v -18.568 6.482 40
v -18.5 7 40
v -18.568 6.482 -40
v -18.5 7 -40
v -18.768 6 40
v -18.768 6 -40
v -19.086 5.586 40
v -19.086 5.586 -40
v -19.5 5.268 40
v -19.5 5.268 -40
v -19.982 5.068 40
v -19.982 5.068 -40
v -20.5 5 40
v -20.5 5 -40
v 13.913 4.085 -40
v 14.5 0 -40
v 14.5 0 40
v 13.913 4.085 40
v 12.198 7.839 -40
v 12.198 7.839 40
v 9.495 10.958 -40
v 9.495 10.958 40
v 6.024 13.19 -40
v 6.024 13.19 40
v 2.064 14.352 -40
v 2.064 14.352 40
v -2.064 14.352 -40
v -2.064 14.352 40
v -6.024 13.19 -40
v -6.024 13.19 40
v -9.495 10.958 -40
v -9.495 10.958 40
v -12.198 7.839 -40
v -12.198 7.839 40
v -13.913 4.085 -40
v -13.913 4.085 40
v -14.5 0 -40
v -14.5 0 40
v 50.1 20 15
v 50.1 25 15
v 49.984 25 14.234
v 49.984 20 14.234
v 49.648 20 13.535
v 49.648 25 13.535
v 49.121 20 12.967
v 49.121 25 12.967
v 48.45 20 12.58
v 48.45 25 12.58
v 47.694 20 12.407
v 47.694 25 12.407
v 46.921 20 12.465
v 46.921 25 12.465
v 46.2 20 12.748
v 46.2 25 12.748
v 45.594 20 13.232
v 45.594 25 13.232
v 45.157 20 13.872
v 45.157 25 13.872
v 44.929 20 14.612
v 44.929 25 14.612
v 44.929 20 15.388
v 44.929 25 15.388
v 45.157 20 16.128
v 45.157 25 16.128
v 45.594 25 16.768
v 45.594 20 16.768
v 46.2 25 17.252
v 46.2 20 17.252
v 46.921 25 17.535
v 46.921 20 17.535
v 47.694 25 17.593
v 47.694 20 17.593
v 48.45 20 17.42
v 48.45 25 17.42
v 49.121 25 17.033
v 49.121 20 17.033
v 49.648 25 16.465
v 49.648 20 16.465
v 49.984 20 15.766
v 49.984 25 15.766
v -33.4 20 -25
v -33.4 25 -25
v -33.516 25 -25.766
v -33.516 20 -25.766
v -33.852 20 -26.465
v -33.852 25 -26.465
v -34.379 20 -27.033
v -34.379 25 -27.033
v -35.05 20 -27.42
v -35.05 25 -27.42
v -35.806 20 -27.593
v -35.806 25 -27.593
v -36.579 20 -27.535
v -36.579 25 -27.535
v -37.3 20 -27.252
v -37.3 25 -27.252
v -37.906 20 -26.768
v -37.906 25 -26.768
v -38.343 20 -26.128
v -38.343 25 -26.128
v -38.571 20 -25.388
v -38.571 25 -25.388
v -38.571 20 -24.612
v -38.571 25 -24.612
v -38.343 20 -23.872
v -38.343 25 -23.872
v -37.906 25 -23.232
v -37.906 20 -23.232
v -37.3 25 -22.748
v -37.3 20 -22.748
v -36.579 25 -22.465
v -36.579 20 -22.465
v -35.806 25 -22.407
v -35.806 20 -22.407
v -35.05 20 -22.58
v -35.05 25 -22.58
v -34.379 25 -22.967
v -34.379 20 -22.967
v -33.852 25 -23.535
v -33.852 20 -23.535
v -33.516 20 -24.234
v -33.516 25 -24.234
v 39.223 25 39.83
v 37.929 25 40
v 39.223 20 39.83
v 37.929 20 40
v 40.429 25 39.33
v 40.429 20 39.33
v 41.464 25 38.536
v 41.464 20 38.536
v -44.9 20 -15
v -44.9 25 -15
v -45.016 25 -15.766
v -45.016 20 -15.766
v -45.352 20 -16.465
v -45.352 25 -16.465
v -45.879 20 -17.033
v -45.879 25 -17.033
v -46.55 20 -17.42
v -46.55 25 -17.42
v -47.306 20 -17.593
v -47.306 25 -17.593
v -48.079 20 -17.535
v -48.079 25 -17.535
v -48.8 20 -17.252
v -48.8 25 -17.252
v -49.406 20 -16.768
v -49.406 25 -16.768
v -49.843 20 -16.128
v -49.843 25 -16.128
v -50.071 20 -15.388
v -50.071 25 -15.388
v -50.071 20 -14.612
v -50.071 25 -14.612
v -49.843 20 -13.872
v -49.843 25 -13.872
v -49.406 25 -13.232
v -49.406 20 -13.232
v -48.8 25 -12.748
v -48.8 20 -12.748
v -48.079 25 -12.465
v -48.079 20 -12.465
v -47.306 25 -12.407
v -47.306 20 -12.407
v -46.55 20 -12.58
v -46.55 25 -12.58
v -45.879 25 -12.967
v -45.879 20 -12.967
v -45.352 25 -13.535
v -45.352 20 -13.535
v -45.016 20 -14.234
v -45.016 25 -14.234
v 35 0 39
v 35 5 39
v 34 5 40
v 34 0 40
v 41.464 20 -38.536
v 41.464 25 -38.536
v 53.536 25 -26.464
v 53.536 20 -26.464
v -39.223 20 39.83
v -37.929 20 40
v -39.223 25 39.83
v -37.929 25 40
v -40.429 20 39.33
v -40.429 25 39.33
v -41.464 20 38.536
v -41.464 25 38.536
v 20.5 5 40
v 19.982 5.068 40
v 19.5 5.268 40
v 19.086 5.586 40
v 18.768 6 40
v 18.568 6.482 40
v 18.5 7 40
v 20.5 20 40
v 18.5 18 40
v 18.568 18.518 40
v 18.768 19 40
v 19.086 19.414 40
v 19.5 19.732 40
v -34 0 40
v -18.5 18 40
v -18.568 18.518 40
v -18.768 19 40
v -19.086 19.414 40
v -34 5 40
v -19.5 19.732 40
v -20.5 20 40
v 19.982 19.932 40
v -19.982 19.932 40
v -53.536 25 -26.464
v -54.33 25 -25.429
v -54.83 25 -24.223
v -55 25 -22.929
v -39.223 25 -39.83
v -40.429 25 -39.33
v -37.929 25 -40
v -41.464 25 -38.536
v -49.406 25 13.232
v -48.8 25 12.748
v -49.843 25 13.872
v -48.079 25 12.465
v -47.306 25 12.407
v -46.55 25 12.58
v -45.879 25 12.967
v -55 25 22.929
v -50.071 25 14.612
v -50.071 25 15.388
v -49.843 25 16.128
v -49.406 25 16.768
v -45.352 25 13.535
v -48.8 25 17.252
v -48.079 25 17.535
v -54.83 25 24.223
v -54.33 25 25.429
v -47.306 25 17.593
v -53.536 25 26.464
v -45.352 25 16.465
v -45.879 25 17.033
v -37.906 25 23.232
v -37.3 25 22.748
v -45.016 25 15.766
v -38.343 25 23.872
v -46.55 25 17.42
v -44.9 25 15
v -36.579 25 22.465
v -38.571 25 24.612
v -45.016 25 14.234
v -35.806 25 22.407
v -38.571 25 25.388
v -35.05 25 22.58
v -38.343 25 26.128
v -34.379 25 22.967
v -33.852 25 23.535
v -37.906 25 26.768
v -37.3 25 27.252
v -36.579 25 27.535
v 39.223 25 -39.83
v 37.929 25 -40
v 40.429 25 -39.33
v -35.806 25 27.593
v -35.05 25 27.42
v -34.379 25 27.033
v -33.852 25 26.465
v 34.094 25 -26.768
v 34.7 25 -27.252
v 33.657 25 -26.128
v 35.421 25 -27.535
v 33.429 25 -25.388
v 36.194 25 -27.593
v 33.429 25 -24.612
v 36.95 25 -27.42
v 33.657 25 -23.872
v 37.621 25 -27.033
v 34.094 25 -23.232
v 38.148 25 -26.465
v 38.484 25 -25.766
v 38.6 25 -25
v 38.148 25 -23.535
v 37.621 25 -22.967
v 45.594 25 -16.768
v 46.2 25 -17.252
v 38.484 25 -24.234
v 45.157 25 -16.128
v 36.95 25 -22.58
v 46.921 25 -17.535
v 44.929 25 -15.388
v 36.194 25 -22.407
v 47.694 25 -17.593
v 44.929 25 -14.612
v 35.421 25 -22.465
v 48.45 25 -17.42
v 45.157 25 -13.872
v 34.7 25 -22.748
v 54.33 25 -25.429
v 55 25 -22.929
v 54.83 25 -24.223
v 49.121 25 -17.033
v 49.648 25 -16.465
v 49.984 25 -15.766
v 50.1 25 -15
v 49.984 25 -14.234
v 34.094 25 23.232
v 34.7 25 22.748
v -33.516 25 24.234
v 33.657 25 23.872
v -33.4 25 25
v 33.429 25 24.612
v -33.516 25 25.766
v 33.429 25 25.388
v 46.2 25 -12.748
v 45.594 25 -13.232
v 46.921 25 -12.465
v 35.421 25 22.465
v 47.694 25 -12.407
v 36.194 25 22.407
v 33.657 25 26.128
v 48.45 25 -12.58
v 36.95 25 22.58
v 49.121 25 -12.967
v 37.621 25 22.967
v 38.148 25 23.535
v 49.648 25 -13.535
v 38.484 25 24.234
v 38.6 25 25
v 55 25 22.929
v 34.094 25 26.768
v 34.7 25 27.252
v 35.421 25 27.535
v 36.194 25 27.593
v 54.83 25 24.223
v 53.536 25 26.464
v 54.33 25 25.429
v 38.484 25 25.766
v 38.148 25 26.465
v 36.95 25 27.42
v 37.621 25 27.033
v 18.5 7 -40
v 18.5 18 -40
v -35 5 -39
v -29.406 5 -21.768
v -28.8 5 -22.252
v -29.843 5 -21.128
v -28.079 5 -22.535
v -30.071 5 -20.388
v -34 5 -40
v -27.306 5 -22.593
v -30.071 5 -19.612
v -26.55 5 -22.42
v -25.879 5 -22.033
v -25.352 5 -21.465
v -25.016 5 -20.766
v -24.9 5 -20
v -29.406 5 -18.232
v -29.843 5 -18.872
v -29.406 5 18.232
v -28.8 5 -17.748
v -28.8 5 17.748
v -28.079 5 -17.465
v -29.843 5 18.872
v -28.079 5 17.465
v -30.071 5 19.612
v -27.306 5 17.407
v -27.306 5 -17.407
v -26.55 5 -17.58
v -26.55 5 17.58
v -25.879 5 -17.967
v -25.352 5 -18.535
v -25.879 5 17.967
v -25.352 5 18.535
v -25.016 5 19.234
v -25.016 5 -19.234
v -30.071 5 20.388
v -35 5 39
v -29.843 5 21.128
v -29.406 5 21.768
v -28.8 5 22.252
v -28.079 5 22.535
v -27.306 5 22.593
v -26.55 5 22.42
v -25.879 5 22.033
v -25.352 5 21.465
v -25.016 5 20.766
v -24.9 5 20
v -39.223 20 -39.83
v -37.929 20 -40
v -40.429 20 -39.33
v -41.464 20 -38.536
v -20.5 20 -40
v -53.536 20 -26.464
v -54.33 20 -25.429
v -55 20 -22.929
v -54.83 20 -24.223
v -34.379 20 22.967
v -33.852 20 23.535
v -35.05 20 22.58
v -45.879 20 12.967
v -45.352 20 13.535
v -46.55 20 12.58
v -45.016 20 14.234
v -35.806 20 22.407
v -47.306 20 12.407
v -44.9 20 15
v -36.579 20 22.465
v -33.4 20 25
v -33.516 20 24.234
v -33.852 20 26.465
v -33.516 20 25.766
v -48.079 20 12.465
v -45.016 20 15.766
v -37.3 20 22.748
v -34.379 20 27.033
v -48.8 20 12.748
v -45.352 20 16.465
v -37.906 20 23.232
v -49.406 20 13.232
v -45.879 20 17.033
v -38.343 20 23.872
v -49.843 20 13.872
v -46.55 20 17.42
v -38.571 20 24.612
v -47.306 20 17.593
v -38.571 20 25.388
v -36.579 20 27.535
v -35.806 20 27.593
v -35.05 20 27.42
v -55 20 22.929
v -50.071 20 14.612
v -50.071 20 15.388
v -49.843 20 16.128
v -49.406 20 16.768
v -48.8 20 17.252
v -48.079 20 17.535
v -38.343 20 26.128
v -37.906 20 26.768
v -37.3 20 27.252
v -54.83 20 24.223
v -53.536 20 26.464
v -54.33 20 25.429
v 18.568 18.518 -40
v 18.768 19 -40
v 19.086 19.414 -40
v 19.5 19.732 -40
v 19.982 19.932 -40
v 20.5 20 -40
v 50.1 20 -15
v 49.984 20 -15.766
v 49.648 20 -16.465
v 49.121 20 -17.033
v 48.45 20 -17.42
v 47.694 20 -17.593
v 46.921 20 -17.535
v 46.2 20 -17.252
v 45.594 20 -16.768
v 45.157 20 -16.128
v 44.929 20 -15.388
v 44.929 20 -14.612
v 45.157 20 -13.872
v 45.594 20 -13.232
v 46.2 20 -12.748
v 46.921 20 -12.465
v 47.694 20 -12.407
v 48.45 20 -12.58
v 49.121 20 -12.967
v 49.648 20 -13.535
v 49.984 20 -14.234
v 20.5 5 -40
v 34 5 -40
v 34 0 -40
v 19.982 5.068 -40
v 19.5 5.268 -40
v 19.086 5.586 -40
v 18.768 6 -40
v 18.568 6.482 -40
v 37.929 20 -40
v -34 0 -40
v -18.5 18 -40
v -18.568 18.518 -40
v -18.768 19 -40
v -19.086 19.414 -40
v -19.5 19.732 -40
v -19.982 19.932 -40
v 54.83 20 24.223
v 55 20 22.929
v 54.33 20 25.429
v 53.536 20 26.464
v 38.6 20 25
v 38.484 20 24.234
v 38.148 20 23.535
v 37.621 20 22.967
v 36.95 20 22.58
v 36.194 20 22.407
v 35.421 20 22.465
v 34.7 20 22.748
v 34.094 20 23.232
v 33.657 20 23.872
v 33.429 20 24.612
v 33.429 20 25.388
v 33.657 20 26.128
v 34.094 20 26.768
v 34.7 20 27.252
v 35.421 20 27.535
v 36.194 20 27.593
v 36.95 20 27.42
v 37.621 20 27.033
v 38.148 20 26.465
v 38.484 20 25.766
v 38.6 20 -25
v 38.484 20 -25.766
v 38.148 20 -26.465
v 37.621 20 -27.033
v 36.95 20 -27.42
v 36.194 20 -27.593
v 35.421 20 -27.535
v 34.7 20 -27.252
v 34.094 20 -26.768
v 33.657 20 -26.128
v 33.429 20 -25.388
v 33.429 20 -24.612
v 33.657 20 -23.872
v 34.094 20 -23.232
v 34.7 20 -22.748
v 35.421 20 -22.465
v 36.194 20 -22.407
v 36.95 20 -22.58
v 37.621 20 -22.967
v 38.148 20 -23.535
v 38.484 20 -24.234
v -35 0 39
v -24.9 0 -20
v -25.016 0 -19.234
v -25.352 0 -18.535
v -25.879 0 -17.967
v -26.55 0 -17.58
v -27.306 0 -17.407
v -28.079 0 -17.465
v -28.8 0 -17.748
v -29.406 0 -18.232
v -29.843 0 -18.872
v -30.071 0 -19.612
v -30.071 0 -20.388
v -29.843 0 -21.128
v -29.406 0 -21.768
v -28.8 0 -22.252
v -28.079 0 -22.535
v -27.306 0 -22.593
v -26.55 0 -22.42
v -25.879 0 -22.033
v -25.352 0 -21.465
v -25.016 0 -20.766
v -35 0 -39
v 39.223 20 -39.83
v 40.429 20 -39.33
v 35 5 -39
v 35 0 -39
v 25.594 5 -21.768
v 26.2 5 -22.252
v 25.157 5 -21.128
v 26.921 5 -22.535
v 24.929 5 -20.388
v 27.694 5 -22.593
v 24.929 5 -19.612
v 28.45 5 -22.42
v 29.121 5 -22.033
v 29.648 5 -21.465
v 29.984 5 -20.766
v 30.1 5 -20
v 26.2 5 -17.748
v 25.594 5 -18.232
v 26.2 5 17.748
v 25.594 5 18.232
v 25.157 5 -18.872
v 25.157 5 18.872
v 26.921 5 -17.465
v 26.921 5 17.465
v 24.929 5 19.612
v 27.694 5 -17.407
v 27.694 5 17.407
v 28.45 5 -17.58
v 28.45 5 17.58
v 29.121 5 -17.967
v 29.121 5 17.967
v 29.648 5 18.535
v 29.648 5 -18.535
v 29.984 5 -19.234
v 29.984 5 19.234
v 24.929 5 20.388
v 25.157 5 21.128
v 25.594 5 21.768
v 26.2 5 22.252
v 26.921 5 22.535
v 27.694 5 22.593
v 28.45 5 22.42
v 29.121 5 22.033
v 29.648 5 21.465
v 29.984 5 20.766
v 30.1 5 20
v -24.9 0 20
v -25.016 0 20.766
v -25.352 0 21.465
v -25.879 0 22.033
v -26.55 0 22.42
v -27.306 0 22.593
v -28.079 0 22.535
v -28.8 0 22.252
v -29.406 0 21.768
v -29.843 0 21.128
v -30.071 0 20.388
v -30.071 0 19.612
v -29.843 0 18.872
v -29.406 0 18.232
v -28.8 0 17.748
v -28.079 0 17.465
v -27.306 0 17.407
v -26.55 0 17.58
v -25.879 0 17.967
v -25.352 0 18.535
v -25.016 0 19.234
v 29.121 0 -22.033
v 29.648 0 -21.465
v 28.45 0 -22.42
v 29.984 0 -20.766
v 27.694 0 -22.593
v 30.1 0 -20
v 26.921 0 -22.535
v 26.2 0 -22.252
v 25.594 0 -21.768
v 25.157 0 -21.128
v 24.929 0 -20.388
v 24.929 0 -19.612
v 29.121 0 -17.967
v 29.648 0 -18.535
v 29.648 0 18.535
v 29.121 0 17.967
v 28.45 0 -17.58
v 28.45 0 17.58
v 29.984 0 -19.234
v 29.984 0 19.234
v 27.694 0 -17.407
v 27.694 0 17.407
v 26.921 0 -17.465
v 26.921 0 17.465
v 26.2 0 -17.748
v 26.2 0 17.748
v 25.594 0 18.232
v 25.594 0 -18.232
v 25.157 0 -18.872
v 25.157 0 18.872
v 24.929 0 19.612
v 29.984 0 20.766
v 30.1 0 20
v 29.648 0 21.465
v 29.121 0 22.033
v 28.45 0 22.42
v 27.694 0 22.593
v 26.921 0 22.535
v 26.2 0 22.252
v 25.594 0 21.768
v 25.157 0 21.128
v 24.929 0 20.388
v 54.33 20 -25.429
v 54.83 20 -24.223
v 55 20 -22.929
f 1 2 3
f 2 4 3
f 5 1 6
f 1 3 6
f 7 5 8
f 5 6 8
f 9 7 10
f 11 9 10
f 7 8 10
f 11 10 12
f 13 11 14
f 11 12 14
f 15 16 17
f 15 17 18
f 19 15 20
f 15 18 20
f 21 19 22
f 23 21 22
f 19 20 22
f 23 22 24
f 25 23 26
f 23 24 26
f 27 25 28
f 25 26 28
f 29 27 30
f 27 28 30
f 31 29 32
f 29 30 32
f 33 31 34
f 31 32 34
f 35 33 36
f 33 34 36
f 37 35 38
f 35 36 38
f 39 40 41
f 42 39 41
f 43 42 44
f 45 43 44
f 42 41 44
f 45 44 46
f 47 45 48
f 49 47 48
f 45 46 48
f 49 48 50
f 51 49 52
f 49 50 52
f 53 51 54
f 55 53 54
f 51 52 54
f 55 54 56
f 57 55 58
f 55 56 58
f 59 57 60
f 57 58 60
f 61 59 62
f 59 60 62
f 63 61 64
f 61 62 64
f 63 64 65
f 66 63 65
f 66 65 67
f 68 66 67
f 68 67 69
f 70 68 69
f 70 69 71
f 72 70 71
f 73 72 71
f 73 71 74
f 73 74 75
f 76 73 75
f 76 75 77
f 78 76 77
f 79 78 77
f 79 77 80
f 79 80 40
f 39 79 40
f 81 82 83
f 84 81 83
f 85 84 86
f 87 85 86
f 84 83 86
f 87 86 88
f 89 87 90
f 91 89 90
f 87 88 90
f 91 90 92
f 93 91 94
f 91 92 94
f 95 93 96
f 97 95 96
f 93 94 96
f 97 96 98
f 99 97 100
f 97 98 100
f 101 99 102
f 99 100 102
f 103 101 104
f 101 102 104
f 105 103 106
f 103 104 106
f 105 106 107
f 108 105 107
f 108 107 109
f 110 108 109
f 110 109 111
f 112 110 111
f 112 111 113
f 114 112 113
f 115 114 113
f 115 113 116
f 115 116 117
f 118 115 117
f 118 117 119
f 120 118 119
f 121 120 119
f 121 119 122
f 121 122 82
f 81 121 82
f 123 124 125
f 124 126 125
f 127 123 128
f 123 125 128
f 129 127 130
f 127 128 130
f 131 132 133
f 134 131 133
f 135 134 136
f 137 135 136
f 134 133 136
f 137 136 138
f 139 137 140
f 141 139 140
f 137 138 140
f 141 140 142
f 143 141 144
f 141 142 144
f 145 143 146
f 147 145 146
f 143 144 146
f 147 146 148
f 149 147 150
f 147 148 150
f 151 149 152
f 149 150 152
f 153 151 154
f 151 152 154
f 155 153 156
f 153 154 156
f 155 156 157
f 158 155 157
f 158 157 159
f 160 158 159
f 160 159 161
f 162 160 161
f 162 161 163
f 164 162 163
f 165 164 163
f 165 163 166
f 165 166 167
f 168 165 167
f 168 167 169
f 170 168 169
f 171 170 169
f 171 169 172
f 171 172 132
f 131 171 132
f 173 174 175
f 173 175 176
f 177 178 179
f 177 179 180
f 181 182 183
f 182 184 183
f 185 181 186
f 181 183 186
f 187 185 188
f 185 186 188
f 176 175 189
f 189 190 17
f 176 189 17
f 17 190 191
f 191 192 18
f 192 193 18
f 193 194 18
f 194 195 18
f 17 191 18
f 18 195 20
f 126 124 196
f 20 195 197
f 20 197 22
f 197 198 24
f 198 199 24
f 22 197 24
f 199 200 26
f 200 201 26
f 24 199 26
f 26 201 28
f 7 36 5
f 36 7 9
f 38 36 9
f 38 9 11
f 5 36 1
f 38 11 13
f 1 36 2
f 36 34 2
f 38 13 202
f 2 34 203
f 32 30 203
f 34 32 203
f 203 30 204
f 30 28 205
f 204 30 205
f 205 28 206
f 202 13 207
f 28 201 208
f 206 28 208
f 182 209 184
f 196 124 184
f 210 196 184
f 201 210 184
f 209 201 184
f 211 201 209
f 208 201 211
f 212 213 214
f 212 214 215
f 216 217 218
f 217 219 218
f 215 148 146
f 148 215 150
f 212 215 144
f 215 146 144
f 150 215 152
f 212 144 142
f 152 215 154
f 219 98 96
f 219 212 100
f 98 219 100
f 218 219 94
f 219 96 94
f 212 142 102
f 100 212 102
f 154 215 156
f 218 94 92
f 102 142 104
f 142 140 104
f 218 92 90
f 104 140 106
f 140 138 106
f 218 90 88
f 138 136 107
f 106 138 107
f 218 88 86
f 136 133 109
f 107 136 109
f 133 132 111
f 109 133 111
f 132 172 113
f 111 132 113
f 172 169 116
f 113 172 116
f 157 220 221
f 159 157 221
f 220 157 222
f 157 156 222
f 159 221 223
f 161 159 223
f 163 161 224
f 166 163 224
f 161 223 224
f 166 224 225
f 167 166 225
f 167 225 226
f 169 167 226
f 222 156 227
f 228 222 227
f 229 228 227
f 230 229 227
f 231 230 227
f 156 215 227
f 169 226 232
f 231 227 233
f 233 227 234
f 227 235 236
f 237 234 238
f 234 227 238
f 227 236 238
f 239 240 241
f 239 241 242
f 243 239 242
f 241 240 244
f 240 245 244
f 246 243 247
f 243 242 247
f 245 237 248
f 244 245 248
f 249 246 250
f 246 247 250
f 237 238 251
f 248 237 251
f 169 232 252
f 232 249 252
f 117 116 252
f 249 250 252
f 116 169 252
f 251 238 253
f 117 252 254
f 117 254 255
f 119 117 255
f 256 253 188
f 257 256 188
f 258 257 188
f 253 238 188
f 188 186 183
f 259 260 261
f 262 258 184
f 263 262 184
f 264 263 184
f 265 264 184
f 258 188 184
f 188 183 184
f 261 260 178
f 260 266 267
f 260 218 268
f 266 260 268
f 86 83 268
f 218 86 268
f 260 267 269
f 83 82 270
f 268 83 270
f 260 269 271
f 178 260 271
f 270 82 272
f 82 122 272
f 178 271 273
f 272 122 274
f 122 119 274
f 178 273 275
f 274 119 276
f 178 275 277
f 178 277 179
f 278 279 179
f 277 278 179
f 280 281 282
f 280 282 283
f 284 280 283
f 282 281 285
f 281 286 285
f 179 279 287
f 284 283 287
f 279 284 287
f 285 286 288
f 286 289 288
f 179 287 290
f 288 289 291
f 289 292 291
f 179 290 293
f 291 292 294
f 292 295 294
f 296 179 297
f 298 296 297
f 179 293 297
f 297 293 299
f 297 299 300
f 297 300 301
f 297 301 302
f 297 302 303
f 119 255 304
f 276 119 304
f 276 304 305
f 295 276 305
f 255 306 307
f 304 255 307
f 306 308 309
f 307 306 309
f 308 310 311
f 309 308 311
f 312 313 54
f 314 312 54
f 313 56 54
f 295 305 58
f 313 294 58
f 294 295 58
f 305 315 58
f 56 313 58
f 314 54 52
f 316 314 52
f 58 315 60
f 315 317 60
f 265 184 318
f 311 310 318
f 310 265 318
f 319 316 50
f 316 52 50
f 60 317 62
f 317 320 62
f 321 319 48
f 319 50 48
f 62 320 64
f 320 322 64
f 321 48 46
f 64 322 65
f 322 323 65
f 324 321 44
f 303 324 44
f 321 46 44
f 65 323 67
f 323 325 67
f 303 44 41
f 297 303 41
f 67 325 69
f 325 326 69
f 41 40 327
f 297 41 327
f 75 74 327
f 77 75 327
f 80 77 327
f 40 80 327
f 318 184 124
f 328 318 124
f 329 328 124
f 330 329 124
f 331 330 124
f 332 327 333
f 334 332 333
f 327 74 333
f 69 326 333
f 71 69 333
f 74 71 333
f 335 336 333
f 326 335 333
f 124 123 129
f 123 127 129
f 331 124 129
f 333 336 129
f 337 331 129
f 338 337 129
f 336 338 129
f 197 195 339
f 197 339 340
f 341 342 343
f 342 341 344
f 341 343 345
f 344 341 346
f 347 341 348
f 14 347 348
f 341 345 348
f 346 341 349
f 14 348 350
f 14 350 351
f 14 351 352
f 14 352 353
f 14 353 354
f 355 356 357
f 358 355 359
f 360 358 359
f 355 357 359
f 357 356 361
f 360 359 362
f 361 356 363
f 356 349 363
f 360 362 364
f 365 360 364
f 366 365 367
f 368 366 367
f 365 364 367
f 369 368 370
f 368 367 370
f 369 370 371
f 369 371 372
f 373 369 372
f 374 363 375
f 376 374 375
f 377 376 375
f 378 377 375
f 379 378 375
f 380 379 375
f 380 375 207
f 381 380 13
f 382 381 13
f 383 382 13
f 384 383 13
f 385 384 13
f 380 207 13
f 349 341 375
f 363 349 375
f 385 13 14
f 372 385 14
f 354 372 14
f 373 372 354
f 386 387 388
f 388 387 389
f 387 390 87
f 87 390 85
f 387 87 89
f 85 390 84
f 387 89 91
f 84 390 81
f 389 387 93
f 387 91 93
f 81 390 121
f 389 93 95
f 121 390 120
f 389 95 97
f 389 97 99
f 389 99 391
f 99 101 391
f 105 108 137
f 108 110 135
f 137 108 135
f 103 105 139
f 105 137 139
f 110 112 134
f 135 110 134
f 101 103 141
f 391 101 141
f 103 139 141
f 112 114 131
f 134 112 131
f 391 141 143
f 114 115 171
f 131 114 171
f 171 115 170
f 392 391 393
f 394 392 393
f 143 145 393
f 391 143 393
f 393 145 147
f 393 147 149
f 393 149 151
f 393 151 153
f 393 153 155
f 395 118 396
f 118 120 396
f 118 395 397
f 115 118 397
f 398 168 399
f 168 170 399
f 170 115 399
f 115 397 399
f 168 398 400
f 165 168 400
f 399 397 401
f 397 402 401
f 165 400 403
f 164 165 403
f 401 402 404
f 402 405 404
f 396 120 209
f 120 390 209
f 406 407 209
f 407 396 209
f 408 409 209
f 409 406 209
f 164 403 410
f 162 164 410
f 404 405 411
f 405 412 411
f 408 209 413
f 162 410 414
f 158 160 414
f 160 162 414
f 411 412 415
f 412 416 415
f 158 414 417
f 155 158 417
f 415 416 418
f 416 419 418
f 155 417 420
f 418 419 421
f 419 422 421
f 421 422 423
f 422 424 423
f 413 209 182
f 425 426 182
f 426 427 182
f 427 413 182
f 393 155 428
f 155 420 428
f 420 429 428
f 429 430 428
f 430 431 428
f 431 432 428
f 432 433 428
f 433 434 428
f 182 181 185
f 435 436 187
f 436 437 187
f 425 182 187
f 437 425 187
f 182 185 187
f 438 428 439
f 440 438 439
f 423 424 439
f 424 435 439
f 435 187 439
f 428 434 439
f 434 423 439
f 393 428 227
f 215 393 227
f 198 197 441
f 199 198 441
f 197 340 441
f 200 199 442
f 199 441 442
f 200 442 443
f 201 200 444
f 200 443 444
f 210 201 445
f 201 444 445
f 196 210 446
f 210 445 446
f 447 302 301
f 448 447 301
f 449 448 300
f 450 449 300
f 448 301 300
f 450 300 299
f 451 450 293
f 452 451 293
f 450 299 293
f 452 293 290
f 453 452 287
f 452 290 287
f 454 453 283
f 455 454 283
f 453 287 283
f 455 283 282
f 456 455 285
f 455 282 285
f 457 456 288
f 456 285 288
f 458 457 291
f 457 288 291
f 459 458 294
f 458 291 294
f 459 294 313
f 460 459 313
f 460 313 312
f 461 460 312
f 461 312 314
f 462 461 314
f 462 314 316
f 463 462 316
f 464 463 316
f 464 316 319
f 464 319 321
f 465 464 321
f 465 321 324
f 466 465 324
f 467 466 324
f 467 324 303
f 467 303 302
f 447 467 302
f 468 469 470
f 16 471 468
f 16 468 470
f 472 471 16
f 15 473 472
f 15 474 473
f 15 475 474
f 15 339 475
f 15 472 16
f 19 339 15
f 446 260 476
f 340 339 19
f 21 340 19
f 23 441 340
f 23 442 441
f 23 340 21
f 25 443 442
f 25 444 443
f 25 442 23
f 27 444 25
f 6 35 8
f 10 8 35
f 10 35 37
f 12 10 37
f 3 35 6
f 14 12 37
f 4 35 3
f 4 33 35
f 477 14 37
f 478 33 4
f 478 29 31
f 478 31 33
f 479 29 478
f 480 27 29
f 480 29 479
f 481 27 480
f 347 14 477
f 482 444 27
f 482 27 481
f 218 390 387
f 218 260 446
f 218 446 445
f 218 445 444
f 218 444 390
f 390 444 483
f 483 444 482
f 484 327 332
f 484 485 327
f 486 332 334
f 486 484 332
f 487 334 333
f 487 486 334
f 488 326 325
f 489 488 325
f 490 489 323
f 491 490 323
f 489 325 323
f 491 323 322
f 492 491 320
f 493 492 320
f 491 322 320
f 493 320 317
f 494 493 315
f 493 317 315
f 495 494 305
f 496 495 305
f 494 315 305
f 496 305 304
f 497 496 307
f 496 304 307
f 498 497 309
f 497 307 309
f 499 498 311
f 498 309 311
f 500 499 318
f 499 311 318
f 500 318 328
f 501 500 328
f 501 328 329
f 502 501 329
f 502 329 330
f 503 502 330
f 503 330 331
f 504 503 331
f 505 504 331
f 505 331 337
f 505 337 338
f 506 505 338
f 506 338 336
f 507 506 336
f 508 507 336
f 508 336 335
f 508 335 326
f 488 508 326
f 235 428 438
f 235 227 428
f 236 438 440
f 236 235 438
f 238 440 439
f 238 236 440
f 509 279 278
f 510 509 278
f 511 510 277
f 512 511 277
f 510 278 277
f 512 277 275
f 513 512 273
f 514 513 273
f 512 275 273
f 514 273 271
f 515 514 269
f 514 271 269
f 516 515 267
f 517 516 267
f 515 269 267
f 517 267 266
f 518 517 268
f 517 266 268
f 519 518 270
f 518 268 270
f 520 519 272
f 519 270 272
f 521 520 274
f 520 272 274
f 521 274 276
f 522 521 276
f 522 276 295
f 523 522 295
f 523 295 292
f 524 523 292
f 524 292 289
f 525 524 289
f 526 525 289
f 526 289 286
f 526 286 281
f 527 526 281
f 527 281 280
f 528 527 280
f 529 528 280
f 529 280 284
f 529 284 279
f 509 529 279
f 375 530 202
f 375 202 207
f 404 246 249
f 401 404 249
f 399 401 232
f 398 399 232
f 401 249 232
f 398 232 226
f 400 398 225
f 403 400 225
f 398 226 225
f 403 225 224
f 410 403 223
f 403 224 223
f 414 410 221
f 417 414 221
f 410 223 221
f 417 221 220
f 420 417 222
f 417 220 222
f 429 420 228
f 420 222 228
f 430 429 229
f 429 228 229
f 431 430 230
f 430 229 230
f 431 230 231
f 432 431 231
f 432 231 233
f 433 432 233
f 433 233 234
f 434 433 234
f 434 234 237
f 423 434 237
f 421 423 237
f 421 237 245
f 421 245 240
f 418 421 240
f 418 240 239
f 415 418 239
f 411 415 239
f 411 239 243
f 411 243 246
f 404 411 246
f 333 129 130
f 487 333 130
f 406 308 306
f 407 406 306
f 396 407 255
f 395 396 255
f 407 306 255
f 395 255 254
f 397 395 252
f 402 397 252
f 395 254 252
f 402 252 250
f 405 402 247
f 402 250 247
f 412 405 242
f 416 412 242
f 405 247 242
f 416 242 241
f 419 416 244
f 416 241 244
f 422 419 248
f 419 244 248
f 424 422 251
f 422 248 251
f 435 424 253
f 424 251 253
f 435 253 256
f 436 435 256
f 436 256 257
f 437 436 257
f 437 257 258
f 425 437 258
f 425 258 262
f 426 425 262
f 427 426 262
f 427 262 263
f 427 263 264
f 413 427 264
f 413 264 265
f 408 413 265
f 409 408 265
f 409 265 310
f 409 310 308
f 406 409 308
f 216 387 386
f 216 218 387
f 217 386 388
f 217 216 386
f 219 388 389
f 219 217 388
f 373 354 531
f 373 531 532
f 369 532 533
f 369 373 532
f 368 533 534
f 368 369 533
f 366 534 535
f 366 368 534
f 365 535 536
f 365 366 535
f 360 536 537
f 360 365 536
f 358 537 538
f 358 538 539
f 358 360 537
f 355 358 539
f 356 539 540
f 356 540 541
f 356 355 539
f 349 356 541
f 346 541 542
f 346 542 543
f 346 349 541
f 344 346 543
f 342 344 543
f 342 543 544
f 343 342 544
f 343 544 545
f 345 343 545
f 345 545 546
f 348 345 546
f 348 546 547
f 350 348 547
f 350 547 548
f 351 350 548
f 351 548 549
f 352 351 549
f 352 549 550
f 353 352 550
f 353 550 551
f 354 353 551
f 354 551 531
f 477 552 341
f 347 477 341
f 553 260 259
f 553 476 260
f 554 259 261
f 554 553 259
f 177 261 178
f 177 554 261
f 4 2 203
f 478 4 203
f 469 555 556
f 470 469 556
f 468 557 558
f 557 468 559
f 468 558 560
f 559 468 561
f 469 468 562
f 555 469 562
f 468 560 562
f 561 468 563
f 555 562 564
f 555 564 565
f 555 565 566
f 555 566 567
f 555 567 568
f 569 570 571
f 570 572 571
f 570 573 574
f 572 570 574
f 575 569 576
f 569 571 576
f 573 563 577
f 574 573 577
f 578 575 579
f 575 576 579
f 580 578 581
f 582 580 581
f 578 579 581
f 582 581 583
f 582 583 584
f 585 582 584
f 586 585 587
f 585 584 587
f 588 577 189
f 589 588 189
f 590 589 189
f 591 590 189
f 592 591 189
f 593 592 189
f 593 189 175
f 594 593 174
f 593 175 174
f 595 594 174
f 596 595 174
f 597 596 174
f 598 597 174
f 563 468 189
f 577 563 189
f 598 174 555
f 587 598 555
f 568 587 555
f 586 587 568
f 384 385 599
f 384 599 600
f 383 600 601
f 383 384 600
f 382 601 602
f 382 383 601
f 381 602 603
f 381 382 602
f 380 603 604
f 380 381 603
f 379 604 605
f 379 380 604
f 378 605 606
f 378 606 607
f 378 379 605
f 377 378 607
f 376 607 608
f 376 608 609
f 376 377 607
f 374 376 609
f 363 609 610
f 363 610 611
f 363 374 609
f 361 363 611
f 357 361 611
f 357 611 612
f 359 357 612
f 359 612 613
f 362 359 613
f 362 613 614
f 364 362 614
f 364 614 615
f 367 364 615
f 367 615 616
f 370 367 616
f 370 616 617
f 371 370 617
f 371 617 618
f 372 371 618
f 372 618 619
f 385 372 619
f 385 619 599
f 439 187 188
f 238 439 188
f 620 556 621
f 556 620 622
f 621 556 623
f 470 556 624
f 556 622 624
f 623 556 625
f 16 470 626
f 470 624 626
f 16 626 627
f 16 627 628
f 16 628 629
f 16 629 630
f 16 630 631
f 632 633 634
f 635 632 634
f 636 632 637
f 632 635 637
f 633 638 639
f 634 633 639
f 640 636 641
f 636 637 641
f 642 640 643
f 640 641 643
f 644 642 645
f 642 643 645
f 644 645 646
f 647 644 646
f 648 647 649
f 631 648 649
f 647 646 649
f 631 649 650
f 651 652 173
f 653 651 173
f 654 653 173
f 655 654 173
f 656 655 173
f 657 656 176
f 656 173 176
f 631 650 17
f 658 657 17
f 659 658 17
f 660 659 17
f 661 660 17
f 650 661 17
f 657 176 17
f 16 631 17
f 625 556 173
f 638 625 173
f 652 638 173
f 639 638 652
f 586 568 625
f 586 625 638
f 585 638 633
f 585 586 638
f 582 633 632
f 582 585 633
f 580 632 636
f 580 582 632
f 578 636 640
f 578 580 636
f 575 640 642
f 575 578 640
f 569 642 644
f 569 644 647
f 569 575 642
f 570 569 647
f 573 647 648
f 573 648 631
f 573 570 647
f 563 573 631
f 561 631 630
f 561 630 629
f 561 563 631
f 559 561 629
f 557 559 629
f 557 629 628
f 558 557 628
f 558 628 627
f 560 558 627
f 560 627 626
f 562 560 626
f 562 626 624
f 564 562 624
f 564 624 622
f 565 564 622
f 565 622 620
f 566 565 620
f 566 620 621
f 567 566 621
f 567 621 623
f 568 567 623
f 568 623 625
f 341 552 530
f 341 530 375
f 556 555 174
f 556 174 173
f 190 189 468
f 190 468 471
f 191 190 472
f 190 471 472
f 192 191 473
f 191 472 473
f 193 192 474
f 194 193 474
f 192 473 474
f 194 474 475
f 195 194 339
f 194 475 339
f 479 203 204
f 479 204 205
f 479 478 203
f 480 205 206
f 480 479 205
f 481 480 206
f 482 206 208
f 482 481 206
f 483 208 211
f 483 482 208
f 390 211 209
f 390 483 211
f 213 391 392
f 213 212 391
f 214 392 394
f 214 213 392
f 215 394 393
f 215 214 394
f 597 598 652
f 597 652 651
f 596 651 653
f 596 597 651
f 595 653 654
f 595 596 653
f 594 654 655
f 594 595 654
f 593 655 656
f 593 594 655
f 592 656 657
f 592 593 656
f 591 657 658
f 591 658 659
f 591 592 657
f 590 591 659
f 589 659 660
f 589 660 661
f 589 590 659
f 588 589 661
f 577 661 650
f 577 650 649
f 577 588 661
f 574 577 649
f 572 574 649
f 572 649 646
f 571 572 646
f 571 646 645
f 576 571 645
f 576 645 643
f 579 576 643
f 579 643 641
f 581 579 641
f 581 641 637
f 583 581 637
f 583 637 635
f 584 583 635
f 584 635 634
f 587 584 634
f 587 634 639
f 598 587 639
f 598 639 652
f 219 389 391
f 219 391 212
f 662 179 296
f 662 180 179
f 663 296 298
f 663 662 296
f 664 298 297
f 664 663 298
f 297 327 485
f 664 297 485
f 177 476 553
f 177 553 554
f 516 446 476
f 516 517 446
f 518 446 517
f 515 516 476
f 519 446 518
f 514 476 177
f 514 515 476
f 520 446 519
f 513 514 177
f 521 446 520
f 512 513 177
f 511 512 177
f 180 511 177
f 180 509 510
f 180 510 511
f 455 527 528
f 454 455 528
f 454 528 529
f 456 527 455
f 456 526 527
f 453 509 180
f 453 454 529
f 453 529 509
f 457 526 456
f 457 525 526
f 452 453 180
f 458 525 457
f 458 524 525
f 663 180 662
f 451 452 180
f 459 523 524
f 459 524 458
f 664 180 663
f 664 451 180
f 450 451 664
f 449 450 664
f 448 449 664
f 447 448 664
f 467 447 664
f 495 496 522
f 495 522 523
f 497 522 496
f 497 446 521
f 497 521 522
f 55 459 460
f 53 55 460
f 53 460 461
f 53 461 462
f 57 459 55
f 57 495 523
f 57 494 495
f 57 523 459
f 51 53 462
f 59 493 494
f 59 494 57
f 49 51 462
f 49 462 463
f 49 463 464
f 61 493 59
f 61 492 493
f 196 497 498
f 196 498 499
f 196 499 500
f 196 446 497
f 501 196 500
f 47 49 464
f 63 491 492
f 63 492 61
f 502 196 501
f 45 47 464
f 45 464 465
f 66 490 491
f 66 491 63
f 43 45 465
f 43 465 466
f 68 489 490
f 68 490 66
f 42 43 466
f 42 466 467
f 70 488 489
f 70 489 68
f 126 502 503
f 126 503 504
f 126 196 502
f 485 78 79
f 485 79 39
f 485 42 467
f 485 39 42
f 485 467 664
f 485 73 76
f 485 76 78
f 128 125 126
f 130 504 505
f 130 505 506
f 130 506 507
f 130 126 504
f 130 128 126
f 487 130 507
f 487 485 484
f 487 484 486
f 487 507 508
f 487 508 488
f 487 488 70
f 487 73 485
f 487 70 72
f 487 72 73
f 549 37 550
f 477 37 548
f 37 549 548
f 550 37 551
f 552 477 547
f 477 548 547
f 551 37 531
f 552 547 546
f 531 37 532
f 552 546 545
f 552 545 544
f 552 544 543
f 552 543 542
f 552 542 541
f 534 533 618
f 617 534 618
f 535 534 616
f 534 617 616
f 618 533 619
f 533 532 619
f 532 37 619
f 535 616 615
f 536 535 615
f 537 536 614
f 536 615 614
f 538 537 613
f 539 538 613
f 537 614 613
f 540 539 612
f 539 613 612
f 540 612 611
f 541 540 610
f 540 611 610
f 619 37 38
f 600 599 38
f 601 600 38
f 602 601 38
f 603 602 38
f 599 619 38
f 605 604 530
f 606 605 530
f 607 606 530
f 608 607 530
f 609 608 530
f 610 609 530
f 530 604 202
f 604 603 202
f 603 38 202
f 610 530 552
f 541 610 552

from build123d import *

# Parameters (mm, degrees)
EXTRUDE_2_DEPTH     = 40
SKETCH_3_R          = 2.6
CUT_EXTRUDE_2_DEPTH = 20
CHAMFER_2_SIZE      = 1
SKETCH_4_R          = 2.6
CUT_EXTRUDE_3_DEPTH = 10
SKETCH_5_R          = 2.6
CUT_EXTRUDE_4_DEPTH = 10
CHAMFER_3_SIZE      = 15
FILLET_2_R          = 5
SKETCH1_W           = 4
SKETCH1_H           = 15
CUT_EXTRUDE1_DEPTH  = 81
FILLET1_R           = 2


with BuildPart() as part:
    # 草图2 → 凸台-拉伸2 (new body, symmetric)
    with BuildSketch(Plane.XY):
        with BuildLine():
            Line((25, 0), (14.5, 0))
            ThreePointArc((14.5, 0), (0, 14.5), (-14.5, 0))
            Line((-14.5, 0), (-25, 0))
            Line((-25, 0), (-35, 0))
            Line((-35, 0), (-35, 5))
            Line((-35, 5), (-22.5, 5))
            Line((-22.5, 5), (-22.5, 20))
            Line((-22.5, 20), (-35, 20))
            Line((-35, 20), (-55, 20))
            Line((-55, 20), (-55, 25))
            Line((-55, 25), (-35, 25))
            Line((-35, 25), (35, 25))
            Line((35, 25), (55, 25))
            Line((55, 25), (55, 20))
            Line((55, 20), (35, 20))
            Line((35, 20), (22.5, 20))
            Line((22.5, 20), (22.5, 5))
            Line((22.5, 5), (35, 5))
            Line((35, 5), (35, 0))
            Line((35, 0), (25, 0))
        make_face()
    extrude(amount=EXTRUDE_2_DEPTH, both=True)

    # 草图3 → 切除-拉伸2 (cut)
    with BuildSketch(Plane.XZ.offset(-20)):
        with Locations((-27.5, 20)):
            Circle(SKETCH_3_R)
        with Locations((27.5, 20)):
            Circle(SKETCH_3_R)
        with Locations((27.5, -20)):
            Circle(SKETCH_3_R)
        with Locations((-27.5, -20)):
            Circle(SKETCH_3_R)
    extrude(amount=CUT_EXTRUDE_2_DEPTH, mode=Mode.SUBTRACT)

    # 倒角2
    chamfer_2_edges = [part.edges().sort_by_distance(p)[0] for p in [
        (-35, 2.5, 40),
        (35, 2.5, -40),
        (-35, 2.5, -40),
        (35, 2.5, 40),
    ]]
    chamfer(chamfer_2_edges, length=CHAMFER_2_SIZE)

    # 草图4 → 切除-拉伸3 (cut)
    with BuildSketch(Plane(origin=(0, 25, 0), x_dir=(1, 0, 0), z_dir=(0, 1, 0))):
        with Locations((36, -25)):
            Circle(SKETCH_4_R)
        with Locations((-36, -25)):
            Circle(SKETCH_4_R)
        with Locations((36, 25)):
            Circle(SKETCH_4_R)
        with Locations((-36, 25)):
            Circle(SKETCH_4_R)
    extrude(amount=-CUT_EXTRUDE_3_DEPTH, mode=Mode.SUBTRACT)

    # 草图5 → 切除-拉伸4 (cut)
    with BuildSketch(Plane(origin=(0, 25, 0), x_dir=(1, 0, 0), z_dir=(0, 1, 0))):
        with Locations((-47.5, 15)):
            Circle(SKETCH_5_R)
        with Locations((47.5, 15)):
            Circle(SKETCH_5_R)
        with Locations((47.5, -15)):
            Circle(SKETCH_5_R)
        with Locations((-47.5, -15)):
            Circle(SKETCH_5_R)
    extrude(amount=-CUT_EXTRUDE_4_DEPTH, mode=Mode.SUBTRACT)

    # 倒角3
    chamfer_3_edges = [part.edges().sort_by_distance(p)[0] for p in [
        (-55, 22.5, -40),
        (55, 22.5, -40),
        (55, 22.5, 40),
        (-55, 22.5, 40),
    ]]
    chamfer(chamfer_3_edges, length=CHAMFER_3_SIZE)

    # 圆角2
    fillet_2_edges = [part.edges().sort_by_distance(p)[0] for p in [
        (55, 22.5, 25),
        (55, 22.5, -25),
        (-40, 22.5, -40),
        (40, 22.5, -40),
        (-40, 22.5, 40),
        (40, 22.5, 40),
        (-55, 22.5, 25),
        (-55, 22.5, -25),
    ]]
    fillet(fillet_2_edges, radius=FILLET_2_R)

    # Sketch1 → Cut-Extrude1 (cut, through all)
    with BuildSketch(Plane.XY.offset(40)):
        with Locations((-20.5, 12.5)):
            Rectangle(SKETCH1_W, SKETCH1_H)
        with Locations((20.5, 12.5)):
            Rectangle(SKETCH1_W, SKETCH1_H)
    extrude(amount=-CUT_EXTRUDE1_DEPTH, mode=Mode.SUBTRACT)

    # Fillet1
    fillet1_edges = [part.edges().sort_by_distance(p)[0] for p in [
        (-18.5, 20, 0),
        (-18.5, 5, 0),
        (18.5, 5, 0),
        (18.5, 20, 0),
    ]]
    fillet(fillet1_edges, radius=FILLET1_R)


solid = part.part
